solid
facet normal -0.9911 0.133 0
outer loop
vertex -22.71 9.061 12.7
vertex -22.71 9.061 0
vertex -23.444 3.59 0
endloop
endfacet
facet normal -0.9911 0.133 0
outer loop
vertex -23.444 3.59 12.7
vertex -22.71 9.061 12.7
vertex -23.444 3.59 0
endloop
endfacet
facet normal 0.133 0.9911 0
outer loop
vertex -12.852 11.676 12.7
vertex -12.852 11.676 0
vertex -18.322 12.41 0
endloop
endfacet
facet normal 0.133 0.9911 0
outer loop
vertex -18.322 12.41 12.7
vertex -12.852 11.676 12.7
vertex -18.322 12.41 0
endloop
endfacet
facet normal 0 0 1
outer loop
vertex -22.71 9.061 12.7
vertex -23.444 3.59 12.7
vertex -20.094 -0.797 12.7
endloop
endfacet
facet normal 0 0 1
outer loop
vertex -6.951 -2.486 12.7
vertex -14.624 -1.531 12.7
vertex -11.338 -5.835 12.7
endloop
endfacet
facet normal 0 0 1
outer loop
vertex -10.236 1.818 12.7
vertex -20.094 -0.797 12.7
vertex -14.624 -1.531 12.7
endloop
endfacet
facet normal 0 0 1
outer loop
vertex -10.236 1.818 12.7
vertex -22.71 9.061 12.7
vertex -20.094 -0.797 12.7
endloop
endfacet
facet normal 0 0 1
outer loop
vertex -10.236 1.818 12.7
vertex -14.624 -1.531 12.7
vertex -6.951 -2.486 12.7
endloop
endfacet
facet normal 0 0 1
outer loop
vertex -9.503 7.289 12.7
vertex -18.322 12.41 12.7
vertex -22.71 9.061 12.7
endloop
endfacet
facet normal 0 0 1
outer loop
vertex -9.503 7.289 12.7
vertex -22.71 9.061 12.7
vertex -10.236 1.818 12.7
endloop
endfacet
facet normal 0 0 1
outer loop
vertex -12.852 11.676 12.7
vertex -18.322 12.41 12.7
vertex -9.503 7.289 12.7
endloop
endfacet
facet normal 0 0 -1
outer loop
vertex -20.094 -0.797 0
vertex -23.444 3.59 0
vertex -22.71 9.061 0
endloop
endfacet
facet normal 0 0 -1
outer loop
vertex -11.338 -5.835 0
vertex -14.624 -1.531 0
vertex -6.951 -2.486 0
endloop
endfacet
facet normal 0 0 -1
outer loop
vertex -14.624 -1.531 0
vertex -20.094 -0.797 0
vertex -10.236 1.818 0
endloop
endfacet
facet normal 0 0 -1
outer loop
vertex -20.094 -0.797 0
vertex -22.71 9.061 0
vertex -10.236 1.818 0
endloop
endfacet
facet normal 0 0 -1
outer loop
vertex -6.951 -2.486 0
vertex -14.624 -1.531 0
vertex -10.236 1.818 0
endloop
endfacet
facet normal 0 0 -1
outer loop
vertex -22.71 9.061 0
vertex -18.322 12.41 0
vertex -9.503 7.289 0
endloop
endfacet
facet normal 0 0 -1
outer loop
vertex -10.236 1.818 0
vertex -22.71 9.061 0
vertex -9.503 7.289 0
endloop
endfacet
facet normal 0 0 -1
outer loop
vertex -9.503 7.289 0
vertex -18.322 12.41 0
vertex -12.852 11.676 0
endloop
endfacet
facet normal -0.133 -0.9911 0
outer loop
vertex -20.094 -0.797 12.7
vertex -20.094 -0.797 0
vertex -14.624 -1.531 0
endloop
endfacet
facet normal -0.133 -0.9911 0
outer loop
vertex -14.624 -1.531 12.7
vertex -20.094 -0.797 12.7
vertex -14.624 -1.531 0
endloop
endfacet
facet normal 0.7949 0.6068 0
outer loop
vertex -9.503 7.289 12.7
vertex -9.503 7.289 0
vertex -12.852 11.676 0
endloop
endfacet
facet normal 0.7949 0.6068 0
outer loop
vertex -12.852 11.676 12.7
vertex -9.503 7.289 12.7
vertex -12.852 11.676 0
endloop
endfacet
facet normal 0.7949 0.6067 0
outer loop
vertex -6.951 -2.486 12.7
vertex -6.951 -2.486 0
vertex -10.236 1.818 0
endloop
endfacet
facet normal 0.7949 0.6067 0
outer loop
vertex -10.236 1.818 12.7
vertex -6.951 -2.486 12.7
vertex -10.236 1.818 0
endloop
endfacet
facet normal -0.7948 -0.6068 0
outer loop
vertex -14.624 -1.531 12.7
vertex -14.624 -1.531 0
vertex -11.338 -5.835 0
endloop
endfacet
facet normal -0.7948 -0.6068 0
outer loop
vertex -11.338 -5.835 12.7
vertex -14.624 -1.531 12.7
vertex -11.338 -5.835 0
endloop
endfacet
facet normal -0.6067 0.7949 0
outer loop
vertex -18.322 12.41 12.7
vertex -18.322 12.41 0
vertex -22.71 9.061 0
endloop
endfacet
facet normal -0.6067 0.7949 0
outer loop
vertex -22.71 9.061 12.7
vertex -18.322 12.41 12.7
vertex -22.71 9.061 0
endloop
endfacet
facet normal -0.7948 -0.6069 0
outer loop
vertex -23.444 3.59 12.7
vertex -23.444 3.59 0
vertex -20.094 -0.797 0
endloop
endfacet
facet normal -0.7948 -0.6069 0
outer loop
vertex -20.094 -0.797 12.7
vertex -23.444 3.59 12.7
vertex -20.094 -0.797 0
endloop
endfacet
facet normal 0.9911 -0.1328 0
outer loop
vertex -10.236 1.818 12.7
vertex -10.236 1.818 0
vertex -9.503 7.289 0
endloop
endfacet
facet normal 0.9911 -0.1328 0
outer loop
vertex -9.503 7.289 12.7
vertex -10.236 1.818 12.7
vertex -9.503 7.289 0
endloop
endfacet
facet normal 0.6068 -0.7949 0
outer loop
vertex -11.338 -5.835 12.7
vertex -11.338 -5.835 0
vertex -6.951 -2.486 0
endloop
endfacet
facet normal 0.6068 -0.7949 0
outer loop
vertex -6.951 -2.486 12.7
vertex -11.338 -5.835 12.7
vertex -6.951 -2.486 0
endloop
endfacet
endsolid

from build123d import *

# Parameters (mm, degrees)
F1_DEPTH = 12.7


with BuildPart() as f1:
    # F0 (on Top) → F1 (new body)
    with BuildSketch(Plane.XY):
        Polygon((-6.950833, -2.485712), (-10.236463, 1.818153), (-14.623778, -1.531184), (-11.338149, -5.835049), align=None)
        Polygon((-14.623778, -1.531184), (-10.236463, 1.818153), (-9.502501, 7.288792), (-12.851838, 11.676108), (-18.322477, 12.410069), (-22.709792, 9.060732), (-23.443754, 3.590093), (-20.094417, -0.797222), align=None)
    extrude(amount=F1_DEPTH)


solid = f1.part
